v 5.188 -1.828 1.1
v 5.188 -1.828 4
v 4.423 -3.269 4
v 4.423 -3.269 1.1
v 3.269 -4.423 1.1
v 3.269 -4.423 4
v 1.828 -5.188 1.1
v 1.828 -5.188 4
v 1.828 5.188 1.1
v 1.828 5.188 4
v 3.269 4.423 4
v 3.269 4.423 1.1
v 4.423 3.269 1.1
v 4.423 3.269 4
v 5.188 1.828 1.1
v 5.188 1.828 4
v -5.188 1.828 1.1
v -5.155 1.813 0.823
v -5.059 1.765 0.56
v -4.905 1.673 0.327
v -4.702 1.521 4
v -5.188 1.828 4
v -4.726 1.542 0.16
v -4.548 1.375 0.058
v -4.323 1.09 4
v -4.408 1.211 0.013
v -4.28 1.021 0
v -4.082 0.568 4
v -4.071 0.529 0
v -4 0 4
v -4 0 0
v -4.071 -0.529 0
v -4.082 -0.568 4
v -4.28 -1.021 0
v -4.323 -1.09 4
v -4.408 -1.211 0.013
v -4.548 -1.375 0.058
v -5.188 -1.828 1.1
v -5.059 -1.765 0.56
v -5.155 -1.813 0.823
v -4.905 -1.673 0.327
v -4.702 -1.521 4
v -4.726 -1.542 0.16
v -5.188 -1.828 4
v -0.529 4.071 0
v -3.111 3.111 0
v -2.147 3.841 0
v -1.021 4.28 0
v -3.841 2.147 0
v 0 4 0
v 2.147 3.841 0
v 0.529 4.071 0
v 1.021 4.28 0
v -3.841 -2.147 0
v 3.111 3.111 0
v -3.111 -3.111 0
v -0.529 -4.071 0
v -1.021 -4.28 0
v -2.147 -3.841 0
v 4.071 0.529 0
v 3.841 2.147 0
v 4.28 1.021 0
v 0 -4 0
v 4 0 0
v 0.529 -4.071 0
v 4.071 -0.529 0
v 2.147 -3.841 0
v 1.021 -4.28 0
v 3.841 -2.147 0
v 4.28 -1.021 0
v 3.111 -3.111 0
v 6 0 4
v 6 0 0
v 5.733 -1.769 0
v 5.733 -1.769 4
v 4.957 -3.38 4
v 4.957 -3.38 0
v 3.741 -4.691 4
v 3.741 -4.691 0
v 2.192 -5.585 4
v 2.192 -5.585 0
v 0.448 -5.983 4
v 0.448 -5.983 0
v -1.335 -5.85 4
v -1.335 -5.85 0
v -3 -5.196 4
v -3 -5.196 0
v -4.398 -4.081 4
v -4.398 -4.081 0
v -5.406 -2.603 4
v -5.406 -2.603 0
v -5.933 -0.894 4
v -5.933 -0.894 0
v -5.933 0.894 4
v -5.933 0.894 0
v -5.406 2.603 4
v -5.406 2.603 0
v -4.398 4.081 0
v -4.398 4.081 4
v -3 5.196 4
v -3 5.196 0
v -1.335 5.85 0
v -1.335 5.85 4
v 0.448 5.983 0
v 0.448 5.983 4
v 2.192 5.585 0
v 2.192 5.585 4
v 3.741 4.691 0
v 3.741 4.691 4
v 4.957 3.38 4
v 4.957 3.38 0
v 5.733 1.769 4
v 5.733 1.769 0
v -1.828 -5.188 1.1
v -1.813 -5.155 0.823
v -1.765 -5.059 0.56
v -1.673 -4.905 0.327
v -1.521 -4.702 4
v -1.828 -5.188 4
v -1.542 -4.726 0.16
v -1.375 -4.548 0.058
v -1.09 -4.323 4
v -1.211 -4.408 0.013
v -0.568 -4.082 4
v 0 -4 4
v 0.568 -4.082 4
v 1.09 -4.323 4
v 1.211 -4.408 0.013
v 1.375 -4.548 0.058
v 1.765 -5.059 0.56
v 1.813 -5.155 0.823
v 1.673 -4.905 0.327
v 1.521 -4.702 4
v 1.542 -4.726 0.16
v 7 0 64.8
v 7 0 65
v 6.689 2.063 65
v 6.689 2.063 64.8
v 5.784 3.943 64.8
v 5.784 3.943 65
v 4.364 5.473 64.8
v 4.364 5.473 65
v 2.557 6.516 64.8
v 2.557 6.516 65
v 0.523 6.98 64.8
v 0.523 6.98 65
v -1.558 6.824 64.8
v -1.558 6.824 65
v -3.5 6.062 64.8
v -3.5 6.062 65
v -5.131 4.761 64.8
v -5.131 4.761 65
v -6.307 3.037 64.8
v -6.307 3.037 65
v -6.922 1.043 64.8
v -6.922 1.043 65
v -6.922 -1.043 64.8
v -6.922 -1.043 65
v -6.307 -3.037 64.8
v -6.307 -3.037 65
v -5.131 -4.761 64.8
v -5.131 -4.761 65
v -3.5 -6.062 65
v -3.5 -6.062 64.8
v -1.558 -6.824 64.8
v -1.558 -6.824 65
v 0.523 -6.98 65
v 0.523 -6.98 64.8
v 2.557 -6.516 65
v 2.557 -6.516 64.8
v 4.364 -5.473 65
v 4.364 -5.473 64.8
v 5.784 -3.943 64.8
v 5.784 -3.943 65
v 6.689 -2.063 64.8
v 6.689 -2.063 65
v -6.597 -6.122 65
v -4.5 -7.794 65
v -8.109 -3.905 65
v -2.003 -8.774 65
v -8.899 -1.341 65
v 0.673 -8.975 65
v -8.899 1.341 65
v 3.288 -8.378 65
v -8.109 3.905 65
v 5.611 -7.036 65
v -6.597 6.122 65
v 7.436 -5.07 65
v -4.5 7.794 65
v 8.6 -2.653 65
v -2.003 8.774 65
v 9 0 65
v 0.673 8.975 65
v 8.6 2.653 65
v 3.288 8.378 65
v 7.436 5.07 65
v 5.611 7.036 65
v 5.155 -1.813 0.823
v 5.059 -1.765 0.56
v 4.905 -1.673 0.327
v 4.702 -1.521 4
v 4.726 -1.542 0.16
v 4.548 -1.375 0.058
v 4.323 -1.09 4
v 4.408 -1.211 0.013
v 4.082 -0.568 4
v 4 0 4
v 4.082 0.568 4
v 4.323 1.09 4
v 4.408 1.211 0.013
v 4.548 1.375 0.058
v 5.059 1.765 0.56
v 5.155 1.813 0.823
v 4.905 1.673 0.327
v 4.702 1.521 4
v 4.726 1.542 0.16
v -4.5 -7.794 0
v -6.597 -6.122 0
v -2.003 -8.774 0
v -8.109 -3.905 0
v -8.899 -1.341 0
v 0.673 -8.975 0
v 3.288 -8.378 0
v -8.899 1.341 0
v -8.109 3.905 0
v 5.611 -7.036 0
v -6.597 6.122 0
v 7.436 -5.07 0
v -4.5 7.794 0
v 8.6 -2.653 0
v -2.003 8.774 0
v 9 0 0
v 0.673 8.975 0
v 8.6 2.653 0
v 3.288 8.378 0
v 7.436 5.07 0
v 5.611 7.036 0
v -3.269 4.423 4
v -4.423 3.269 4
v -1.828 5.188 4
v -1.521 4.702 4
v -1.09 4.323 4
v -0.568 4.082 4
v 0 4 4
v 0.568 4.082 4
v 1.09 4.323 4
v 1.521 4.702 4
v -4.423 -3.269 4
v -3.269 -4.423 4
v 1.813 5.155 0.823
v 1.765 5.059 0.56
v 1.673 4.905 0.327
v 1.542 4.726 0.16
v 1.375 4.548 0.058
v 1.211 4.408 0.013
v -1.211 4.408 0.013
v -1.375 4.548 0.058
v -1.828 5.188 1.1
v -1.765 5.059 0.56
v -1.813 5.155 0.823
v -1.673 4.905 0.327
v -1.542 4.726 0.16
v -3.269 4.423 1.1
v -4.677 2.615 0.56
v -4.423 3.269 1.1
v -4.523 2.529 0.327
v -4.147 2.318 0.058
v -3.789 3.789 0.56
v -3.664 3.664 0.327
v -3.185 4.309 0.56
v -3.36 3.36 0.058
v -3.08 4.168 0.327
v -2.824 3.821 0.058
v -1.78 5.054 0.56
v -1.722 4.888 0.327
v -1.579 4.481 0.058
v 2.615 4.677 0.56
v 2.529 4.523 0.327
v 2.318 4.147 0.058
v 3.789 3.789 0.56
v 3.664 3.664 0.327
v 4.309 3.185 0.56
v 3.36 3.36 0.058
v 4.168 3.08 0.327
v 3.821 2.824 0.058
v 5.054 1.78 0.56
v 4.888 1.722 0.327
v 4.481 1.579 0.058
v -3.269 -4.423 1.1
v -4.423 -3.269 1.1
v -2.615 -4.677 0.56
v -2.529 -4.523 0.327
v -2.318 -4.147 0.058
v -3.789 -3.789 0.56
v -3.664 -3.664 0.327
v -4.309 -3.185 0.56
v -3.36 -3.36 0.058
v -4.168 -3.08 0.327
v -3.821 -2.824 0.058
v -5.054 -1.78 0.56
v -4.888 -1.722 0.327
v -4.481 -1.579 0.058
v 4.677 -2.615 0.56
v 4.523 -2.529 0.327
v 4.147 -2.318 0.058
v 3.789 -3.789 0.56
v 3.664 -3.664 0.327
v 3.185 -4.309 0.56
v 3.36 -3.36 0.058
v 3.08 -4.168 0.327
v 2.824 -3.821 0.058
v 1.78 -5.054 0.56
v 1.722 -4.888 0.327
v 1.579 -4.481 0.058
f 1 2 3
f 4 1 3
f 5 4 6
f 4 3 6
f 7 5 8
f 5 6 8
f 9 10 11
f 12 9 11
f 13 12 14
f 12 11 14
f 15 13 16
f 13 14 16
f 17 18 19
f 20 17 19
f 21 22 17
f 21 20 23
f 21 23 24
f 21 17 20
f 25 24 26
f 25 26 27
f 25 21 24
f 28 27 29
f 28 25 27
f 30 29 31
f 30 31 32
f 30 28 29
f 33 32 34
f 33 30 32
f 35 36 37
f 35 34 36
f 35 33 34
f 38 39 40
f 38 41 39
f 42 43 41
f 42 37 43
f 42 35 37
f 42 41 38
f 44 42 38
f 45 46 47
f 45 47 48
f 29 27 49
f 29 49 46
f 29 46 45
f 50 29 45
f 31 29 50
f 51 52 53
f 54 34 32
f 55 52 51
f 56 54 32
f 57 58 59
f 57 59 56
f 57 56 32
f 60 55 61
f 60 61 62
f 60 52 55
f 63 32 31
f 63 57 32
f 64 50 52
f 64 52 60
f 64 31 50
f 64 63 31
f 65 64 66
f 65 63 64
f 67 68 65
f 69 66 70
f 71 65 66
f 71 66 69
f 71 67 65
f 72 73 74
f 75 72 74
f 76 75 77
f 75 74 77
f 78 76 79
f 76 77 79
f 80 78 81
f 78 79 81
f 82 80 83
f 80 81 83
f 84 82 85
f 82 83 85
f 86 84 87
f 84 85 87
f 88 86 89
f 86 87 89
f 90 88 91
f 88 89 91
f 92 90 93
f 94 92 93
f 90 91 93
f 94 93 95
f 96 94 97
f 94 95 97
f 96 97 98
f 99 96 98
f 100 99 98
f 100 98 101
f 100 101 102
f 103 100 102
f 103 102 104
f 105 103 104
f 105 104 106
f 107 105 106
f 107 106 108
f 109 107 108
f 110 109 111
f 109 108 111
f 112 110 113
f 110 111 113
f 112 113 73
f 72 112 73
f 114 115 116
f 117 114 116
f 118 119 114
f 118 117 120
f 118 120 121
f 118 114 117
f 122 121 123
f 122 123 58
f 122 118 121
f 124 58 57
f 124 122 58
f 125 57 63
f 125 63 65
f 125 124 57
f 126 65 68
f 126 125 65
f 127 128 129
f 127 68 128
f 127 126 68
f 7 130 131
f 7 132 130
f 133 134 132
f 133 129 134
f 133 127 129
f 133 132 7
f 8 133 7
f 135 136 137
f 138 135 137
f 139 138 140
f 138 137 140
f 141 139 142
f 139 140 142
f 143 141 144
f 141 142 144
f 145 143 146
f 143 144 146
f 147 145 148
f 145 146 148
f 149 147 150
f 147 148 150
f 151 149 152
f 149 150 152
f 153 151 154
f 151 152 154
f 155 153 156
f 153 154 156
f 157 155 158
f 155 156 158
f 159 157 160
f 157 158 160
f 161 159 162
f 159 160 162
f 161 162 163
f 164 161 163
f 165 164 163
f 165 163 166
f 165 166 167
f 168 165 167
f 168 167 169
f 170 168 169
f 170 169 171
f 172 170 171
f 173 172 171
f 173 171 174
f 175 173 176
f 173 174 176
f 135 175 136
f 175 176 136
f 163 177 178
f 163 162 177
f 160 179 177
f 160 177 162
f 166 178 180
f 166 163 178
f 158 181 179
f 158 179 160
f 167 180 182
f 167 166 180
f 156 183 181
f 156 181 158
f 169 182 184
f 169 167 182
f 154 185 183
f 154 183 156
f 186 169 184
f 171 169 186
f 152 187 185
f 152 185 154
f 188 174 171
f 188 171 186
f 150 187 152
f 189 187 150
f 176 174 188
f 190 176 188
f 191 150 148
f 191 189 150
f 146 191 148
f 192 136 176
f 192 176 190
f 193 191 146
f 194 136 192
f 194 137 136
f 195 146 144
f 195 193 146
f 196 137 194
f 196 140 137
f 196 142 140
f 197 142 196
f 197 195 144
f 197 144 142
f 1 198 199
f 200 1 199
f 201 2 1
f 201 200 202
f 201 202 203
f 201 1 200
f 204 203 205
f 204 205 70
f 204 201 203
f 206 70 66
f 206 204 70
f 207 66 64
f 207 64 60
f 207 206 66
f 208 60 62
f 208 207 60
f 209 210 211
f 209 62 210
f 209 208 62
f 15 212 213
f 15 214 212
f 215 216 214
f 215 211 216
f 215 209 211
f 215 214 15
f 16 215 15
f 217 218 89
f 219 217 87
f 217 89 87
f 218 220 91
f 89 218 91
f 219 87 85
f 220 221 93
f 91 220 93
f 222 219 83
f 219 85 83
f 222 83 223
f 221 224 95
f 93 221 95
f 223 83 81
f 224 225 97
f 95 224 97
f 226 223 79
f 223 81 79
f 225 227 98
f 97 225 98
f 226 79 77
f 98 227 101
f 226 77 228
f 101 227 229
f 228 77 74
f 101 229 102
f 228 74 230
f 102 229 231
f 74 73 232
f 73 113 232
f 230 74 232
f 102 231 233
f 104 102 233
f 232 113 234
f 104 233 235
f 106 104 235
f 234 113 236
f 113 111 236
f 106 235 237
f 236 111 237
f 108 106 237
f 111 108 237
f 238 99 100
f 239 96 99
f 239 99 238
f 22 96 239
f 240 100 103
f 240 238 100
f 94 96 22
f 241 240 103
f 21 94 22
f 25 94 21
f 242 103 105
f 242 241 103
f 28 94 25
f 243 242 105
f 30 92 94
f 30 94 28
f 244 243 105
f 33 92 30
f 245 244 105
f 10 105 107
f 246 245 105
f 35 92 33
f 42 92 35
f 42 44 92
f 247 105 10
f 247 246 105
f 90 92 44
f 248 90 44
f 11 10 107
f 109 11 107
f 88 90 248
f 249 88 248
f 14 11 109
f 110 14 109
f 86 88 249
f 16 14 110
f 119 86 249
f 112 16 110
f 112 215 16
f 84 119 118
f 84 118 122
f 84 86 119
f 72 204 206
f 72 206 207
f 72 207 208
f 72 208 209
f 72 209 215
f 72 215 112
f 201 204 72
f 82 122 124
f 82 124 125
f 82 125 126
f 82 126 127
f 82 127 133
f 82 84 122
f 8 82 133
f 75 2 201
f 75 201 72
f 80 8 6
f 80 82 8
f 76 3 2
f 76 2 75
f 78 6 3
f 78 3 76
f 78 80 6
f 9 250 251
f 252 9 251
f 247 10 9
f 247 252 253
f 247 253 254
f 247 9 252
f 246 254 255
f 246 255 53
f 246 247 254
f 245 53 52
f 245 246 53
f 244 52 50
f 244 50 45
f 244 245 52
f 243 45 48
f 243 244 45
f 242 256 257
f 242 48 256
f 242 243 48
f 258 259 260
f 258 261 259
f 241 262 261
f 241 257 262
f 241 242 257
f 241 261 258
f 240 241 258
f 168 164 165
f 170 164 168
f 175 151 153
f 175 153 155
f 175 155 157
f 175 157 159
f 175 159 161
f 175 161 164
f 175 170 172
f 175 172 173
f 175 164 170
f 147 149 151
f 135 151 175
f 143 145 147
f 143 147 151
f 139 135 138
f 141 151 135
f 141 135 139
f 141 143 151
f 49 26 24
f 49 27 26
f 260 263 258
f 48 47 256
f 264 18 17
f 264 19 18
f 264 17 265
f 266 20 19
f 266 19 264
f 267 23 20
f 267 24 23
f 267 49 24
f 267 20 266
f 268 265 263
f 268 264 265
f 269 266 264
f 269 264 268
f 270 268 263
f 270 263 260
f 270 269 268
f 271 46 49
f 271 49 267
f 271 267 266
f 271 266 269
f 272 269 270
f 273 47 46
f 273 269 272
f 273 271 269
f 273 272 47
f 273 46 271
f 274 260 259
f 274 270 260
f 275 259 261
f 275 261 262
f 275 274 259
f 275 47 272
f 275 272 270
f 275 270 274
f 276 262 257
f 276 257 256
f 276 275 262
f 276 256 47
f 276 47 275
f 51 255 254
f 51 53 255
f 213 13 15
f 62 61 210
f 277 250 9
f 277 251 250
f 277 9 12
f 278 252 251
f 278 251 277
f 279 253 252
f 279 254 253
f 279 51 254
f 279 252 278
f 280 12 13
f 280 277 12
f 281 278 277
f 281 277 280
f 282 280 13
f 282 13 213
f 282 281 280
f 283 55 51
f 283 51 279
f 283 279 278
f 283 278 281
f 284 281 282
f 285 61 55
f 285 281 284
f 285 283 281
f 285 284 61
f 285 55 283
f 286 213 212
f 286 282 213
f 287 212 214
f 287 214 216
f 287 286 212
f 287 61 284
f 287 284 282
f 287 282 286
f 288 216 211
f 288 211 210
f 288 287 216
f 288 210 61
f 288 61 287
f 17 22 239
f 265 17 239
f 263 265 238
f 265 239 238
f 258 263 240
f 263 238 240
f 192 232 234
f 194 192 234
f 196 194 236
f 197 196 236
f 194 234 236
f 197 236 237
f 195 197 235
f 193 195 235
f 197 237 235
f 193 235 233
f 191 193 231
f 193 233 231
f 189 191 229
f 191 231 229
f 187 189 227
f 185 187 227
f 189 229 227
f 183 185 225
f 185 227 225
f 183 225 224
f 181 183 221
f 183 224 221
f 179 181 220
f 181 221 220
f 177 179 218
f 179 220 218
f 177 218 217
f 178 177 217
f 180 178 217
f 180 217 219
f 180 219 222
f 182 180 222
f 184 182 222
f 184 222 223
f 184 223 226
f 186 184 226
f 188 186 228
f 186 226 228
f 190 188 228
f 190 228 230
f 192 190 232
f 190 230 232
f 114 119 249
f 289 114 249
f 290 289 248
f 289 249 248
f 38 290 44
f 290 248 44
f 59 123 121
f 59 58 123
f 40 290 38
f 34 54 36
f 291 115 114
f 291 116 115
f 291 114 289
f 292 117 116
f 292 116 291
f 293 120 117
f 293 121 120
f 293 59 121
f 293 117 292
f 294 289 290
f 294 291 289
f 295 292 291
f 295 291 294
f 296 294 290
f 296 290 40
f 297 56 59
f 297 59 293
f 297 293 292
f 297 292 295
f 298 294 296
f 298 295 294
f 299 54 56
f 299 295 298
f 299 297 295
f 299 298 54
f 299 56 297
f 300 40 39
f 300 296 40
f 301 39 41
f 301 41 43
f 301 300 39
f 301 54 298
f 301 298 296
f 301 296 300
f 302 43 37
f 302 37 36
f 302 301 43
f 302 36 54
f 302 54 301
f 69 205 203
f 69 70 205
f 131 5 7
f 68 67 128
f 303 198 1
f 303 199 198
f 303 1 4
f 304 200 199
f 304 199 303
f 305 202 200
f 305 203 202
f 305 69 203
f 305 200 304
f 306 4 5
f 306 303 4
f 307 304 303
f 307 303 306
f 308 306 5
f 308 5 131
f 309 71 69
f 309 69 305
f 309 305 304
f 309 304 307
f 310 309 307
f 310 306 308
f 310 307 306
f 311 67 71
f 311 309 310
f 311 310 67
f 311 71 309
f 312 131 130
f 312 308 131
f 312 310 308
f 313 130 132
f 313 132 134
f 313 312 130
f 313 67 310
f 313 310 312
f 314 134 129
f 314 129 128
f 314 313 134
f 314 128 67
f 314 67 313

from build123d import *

# Parameters (mm, degrees)
CYLINDER_R      = 9
CYLINDER_DEPTH  = 65
SKETCH_R        = 7
POCKET_DEPTH    = 0.2
SKETCH001_R     = 6
POCKET001_DEPTH = 4
PAD_DEPTH       = 4
FILLET_R        = 1.1


with BuildPart() as part:
    # Cylinder → Cylinder (new body)
    with BuildSketch(Plane.XY):
        Circle(CYLINDER_R)
    extrude(amount=CYLINDER_DEPTH)

    # Sketch (on Face3 of BaseFeature) → Pocket (cut)
    with BuildSketch(Plane.XY.offset(65)):
        Circle(SKETCH_R)
    extrude(amount=-POCKET_DEPTH, mode=Mode.SUBTRACT)

    # Sketch001 (on Face2 of Pocket) → Pocket001 (cut)
    with BuildSketch(Plane(origin=(0, 0, 0), x_dir=(1, 0, 0), z_dir=(0, 0, -1))):
        Circle(SKETCH001_R)
    extrude(amount=-POCKET001_DEPTH, mode=Mode.SUBTRACT)

    # Sketch002 (on Face6 of Pocket001) → Pad (join)
    with BuildSketch(Plane(origin=(0, 0, 4), x_dir=(1, 0, 0), z_dir=(0, 0, -1))):
        with BuildLine():
            ThreePointArc((-5.1875, -1.827524), (-3.889087, -3.889087), (-1.827524, -5.1875))
            ThreePointArc((1.827524, -5.1875), (0, -4), (-1.827524, -5.1875))
            ThreePointArc((1.827524, -5.1875), (3.889087, -3.889087), (5.1875, -1.827524))
            ThreePointArc((5.1875, 1.827524), (4, 0), (5.1875, -1.827524))
            ThreePointArc((5.1875, 1.827524), (3.889087, 3.889087), (1.827524, 5.1875))
            ThreePointArc((-1.827524, 5.1875), (0, 4), (1.827524, 5.1875))
            ThreePointArc((-1.827524, 5.1875), (-3.889087, 3.889087), (-5.1875, 1.827524))
            ThreePointArc((-5.1875, -1.827524), (-4, 0), (-5.1875, 1.827524))
        make_face()
    extrude(amount=PAD_DEPTH)

    # Fillet
    fillet_edges = [part.edges().sort_by_distance(p)[0] for p in [
        (-3.889087, 3.889087, 0),
        (3.889087, 3.889087, 0),
        (3.889087, -3.889087, 0),
        (-3.889087, -3.889087, 0),
    ]]
    fillet(fillet_edges, radius=FILLET_R)


solid = part.part
